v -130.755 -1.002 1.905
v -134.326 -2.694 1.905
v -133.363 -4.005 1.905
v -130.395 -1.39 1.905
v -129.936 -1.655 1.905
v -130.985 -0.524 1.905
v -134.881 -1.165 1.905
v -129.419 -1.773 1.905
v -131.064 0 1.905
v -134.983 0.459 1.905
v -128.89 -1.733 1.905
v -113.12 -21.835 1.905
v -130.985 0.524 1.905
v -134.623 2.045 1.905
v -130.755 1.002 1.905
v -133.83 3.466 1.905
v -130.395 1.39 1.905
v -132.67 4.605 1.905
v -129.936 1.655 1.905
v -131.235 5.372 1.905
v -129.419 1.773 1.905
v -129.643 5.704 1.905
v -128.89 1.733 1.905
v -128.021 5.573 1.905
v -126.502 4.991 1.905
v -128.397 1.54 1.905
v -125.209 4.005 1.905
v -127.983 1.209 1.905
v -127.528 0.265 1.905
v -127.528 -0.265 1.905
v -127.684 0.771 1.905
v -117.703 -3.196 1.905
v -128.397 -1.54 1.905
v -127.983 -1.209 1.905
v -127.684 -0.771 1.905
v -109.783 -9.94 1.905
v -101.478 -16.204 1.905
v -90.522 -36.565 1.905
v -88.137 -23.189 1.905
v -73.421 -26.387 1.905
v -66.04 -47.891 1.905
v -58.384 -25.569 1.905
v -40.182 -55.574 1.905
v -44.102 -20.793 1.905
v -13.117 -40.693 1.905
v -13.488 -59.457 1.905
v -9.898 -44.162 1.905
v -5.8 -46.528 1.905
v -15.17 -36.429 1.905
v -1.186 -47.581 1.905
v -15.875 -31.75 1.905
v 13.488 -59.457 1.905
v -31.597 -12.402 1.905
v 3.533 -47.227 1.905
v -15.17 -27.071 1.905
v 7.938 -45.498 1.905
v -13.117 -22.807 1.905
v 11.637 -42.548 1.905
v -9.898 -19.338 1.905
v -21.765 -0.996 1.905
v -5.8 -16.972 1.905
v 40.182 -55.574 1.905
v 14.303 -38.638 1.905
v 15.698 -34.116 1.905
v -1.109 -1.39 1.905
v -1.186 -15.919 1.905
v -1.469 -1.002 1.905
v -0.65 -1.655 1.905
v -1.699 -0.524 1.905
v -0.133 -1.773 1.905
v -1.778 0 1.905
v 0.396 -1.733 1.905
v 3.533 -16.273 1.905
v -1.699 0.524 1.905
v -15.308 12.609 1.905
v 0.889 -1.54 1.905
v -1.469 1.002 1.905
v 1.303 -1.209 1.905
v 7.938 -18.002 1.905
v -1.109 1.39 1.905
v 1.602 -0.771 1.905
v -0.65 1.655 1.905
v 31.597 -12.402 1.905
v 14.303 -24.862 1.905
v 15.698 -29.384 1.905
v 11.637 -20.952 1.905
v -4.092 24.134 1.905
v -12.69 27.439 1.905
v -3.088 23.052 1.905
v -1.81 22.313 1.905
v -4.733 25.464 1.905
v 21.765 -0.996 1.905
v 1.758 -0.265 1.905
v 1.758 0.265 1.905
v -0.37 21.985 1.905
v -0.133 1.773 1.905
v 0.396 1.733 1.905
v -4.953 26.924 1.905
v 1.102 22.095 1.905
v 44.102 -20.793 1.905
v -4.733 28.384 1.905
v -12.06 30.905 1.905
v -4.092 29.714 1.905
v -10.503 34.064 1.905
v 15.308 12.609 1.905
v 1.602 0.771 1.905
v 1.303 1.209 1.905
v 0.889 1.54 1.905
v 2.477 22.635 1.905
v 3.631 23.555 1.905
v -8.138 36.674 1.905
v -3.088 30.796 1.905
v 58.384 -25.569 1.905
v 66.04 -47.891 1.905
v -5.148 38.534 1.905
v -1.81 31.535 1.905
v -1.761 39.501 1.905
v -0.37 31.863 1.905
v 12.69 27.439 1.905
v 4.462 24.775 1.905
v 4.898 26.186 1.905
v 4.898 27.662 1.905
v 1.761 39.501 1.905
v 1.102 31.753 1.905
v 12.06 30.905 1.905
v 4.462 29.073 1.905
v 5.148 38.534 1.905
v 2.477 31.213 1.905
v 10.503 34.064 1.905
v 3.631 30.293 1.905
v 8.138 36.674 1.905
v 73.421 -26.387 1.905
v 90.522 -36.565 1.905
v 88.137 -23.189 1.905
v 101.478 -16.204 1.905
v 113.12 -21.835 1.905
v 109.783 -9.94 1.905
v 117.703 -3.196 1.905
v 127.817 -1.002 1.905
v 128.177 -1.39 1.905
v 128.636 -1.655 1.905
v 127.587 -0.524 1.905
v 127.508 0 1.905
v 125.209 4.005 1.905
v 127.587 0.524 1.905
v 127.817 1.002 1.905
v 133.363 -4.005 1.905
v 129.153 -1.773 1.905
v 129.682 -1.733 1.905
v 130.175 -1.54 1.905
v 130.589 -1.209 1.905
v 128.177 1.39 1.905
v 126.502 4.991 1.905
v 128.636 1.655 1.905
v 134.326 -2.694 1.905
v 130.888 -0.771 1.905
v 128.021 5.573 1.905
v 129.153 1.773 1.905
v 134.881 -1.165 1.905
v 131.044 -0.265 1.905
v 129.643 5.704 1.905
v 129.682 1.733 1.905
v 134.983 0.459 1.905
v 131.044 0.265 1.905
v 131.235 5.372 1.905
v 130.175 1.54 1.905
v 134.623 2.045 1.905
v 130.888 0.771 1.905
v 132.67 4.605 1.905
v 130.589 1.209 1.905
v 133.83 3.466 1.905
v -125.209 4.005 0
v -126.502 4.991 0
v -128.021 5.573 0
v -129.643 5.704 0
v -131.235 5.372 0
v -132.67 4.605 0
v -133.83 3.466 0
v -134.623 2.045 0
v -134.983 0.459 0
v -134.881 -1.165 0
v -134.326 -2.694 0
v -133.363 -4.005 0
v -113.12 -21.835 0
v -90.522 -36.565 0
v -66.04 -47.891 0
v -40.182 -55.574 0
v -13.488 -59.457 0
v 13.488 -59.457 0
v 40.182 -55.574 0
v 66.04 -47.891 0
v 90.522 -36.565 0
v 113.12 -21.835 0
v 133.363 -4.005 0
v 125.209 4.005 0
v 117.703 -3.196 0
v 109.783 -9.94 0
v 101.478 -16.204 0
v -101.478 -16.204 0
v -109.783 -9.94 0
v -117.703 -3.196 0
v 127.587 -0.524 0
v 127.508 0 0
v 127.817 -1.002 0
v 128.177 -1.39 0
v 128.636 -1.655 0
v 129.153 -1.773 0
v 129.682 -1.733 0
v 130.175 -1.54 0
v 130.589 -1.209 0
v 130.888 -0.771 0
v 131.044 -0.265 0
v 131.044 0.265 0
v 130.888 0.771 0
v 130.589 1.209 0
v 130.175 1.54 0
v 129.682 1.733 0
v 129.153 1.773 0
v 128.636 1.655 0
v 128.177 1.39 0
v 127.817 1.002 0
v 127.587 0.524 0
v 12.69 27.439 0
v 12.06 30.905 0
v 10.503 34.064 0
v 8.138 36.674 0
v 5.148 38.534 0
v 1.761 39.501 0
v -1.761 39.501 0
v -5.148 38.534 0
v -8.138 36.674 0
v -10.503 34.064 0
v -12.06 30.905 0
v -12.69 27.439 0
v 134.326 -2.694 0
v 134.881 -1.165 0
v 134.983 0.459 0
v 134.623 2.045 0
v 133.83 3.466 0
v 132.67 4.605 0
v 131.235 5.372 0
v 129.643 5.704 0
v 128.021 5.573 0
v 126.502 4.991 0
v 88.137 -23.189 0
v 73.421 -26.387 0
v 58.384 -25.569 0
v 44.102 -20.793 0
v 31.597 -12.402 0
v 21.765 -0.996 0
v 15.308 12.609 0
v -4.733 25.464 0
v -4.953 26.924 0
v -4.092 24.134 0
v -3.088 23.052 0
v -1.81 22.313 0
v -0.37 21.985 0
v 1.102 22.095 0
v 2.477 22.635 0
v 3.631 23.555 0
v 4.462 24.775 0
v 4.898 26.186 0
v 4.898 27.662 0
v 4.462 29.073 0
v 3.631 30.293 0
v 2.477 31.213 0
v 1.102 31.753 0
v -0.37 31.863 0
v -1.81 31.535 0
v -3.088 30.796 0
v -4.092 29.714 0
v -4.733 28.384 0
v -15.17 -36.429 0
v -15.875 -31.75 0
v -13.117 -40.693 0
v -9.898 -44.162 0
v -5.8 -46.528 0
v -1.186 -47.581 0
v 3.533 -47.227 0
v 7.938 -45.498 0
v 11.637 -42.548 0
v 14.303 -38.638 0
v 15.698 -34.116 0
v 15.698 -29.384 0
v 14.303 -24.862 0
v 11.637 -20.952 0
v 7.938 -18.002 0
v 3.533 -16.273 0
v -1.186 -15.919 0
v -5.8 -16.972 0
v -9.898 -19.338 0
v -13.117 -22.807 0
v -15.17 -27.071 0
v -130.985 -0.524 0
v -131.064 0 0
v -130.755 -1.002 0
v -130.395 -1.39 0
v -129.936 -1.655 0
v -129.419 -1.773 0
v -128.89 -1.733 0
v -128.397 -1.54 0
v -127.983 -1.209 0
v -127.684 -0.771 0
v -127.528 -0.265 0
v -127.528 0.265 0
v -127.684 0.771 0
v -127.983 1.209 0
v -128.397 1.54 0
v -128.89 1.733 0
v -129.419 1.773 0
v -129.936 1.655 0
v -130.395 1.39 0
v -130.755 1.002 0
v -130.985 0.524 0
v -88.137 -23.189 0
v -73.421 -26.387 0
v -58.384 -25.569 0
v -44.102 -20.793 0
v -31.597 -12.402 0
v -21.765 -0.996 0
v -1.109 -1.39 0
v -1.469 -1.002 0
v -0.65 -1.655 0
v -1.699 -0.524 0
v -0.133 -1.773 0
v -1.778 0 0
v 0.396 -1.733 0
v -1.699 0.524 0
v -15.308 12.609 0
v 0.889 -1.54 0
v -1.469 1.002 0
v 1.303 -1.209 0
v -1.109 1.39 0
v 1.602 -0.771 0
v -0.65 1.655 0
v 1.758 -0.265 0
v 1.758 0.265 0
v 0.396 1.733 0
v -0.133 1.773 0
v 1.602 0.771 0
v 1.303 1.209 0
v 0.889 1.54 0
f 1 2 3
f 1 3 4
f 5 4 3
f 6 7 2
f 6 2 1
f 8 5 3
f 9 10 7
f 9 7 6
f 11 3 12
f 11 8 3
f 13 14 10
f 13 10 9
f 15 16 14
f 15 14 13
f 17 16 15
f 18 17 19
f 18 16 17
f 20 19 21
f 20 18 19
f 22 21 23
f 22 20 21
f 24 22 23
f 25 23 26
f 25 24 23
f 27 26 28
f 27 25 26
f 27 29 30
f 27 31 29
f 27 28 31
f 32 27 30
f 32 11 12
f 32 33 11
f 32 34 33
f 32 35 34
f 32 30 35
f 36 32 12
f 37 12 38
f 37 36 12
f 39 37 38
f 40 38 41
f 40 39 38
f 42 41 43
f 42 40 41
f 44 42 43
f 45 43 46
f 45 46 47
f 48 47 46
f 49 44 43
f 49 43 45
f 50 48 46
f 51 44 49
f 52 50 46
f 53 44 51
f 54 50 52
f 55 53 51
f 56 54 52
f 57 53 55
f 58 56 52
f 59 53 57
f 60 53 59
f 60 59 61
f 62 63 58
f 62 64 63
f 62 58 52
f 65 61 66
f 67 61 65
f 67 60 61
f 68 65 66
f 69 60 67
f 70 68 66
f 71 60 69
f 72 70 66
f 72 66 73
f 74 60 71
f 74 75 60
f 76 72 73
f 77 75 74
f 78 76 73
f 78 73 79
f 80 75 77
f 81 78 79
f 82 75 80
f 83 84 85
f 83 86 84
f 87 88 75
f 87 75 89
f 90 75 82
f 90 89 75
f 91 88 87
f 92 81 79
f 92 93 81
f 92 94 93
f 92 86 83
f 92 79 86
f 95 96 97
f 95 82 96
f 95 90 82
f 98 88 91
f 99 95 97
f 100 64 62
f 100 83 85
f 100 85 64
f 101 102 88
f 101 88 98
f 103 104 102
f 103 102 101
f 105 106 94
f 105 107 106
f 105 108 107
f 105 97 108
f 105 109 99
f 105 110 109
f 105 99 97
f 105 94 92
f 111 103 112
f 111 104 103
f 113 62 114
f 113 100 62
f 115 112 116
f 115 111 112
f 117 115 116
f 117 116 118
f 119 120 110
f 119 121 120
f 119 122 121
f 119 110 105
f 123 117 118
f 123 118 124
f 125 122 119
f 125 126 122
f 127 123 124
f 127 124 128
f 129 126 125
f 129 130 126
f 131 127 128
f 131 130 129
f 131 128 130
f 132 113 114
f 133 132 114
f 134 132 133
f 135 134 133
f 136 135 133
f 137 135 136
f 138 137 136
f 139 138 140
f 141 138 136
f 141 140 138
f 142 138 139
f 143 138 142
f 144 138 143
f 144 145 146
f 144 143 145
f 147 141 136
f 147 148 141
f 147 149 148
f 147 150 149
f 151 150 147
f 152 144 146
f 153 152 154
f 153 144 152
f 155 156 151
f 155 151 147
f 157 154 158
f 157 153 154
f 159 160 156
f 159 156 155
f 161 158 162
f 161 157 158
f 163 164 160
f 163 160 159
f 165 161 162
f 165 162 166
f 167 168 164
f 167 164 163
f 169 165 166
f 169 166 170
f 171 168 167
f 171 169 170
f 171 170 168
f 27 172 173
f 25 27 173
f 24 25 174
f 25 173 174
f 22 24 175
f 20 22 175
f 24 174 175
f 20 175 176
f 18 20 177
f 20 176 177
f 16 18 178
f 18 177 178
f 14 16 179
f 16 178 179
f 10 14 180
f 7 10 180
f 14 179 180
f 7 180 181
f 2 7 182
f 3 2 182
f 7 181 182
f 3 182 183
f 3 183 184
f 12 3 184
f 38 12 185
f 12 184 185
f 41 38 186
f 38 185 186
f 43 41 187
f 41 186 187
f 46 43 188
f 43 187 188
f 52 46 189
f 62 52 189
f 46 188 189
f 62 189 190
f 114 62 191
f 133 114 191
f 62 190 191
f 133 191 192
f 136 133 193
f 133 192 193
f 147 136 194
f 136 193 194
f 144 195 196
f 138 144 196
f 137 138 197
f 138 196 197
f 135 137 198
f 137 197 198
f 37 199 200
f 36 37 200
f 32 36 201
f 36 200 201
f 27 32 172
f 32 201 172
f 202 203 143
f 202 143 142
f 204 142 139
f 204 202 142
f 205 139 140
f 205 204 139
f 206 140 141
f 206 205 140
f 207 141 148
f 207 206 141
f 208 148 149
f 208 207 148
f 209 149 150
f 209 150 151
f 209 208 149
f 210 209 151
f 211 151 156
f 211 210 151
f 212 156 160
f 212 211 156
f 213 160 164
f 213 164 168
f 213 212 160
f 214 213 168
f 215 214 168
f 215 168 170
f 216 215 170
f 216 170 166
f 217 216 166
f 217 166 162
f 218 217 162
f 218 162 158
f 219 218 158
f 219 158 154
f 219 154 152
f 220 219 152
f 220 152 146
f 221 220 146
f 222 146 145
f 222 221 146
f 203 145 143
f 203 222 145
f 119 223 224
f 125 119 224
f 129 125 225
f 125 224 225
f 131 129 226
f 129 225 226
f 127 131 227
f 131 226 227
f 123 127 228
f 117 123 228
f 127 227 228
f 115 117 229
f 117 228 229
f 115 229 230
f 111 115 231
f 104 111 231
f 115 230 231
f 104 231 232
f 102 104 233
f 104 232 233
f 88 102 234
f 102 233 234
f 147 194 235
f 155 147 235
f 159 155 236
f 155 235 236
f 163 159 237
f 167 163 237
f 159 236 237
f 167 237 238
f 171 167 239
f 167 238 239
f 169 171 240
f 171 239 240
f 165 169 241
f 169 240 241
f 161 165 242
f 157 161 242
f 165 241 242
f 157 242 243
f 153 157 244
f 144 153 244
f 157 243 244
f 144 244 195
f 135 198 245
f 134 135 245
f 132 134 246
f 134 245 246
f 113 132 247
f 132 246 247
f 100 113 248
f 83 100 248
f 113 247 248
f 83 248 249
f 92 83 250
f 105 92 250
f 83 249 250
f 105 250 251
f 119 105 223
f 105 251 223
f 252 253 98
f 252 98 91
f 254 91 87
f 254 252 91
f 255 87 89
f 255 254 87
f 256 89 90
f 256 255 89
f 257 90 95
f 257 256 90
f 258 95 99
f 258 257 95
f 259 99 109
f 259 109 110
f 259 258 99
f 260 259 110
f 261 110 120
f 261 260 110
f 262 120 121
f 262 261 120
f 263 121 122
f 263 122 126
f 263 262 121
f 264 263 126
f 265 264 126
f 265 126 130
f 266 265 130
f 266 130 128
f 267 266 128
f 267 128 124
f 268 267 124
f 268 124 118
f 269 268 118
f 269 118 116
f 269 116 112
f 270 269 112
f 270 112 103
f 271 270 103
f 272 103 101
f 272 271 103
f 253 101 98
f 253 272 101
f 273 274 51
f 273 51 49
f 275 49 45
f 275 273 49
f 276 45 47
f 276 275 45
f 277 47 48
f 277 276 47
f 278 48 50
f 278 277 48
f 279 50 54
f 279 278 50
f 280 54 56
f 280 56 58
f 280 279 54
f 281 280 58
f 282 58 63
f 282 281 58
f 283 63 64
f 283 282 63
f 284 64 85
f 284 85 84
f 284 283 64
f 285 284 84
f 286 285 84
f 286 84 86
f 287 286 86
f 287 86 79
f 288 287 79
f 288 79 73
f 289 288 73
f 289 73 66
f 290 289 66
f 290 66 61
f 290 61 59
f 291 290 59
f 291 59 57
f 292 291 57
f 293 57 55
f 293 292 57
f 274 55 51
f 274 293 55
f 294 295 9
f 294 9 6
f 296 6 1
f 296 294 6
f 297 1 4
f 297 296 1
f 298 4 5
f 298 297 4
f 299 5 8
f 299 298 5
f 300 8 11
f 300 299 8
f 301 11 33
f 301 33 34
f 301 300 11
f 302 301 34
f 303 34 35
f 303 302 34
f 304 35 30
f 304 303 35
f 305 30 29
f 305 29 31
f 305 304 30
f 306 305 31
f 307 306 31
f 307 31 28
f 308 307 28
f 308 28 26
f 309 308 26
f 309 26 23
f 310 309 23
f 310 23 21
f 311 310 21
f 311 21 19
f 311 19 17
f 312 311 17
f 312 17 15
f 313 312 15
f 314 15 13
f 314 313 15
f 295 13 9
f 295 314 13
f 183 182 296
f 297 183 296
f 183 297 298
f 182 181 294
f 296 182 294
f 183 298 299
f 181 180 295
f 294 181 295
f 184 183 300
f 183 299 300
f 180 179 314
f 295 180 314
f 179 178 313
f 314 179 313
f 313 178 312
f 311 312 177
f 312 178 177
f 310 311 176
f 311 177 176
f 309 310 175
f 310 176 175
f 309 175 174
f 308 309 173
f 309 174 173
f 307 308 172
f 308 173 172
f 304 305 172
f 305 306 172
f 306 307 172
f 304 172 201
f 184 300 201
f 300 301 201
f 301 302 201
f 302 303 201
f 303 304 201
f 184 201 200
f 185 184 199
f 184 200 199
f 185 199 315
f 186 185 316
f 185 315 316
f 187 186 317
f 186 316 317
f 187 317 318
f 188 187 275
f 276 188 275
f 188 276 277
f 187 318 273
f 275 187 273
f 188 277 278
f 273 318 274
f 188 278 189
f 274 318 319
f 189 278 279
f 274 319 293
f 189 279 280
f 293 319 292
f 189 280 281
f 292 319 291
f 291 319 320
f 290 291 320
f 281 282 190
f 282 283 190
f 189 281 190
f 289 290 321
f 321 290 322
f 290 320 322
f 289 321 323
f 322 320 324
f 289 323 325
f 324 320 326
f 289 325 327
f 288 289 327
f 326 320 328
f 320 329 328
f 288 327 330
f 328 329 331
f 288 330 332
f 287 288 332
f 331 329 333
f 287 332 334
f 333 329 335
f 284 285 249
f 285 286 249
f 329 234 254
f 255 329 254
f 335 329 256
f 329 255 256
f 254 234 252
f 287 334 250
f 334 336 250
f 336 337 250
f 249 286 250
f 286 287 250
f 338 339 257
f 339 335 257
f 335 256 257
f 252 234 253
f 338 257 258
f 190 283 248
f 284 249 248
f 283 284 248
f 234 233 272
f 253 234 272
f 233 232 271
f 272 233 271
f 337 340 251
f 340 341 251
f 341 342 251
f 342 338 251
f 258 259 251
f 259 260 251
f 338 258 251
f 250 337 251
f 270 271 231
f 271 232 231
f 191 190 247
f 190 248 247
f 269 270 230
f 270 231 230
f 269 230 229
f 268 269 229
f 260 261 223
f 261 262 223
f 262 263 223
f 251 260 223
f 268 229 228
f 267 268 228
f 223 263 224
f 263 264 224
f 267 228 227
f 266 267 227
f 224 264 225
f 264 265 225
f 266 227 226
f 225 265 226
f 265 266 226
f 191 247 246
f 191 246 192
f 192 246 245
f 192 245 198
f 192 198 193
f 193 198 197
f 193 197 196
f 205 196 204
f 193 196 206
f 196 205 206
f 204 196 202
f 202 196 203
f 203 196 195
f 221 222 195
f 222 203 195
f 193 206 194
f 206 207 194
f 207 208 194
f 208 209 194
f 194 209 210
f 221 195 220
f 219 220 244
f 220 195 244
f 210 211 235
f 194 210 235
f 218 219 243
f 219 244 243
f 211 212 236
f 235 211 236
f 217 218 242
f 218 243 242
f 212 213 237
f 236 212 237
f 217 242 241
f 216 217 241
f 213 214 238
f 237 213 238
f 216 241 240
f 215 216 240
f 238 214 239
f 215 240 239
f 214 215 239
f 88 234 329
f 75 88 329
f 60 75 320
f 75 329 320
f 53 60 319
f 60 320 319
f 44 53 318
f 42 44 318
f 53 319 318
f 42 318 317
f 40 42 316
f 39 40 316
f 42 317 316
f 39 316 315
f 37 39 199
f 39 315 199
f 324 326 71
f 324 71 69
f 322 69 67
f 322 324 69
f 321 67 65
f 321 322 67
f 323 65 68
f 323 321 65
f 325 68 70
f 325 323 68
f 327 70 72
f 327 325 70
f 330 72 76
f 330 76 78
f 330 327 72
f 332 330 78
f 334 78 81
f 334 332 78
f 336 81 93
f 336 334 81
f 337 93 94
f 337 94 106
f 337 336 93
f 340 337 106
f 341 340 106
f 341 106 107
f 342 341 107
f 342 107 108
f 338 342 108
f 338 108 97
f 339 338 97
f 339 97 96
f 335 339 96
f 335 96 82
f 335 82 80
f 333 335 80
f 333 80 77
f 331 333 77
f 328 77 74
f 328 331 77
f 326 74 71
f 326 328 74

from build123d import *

# Parameters (mm, degrees)
SKETCH1_R           = 1.778
SKETCH1_R_2         = 4.953
SKETCH1_R_3         = 15.875
BOSS_EXTRUDE1_DEPTH = 1.905


with BuildPart() as part:
    # Sketch1 → Boss-Extrude1 (new body)
    with BuildSketch(Plane.XY):
        with BuildLine():
            ThreePointArc((-133.362998698, -4.004910313), (0, -59.943777505), (133.362998698, -4.004910313))
            ThreePointArc((133.362998698, -4.004910313), (133.290910313, 4.076998698), (125.209001302, 4.004910313))
            ThreePointArc((125.209001302, 4.004910313), (113.793114712, -6.627142221), (101.478252071, -16.203528066))
            ThreePointArc((101.478252071, -16.203528066), (44.101918402, -20.793056649), (12.689537579, 27.439398908))
            ThreePointArc((12.689537579, 27.439398908), (0, 39.624), (-12.689537579, 27.439398908))
            ThreePointArc((-12.689537579, 27.439398908), (-44.101918402, -20.793056649), (-101.478252071, -16.203528066))
            ThreePointArc((-101.478252071, -16.203528066), (-113.793114712, -6.627142221), (-125.209001302, 4.004910313))
            ThreePointArc((-125.209001302, 4.004910313), (-133.290910313, 4.076998698), (-133.362998698, -4.004910313))
        make_face()
        with Locations(Location((0, 0, 0), (0, 0, 180))):
            Circle(SKETCH1_R, mode=Mode.SUBTRACT)
        with Locations(Location((129.286, 0, 0), (0, 0, 180))):
            Circle(SKETCH1_R, mode=Mode.SUBTRACT)
        with Locations(Location((-129.286, 0, 0), (0, 0, 180))):
            Circle(SKETCH1_R, mode=Mode.SUBTRACT)
        with Locations(Location((0, 26.924, 0), (0, 0, 180))):
            Circle(SKETCH1_R_2, mode=Mode.SUBTRACT)
        with Locations(Location((0, -31.75, 0), (0, 0, 180))):
            Circle(SKETCH1_R_3, mode=Mode.SUBTRACT)
    extrude(amount=BOSS_EXTRUDE1_DEPTH)


solid = part.part
